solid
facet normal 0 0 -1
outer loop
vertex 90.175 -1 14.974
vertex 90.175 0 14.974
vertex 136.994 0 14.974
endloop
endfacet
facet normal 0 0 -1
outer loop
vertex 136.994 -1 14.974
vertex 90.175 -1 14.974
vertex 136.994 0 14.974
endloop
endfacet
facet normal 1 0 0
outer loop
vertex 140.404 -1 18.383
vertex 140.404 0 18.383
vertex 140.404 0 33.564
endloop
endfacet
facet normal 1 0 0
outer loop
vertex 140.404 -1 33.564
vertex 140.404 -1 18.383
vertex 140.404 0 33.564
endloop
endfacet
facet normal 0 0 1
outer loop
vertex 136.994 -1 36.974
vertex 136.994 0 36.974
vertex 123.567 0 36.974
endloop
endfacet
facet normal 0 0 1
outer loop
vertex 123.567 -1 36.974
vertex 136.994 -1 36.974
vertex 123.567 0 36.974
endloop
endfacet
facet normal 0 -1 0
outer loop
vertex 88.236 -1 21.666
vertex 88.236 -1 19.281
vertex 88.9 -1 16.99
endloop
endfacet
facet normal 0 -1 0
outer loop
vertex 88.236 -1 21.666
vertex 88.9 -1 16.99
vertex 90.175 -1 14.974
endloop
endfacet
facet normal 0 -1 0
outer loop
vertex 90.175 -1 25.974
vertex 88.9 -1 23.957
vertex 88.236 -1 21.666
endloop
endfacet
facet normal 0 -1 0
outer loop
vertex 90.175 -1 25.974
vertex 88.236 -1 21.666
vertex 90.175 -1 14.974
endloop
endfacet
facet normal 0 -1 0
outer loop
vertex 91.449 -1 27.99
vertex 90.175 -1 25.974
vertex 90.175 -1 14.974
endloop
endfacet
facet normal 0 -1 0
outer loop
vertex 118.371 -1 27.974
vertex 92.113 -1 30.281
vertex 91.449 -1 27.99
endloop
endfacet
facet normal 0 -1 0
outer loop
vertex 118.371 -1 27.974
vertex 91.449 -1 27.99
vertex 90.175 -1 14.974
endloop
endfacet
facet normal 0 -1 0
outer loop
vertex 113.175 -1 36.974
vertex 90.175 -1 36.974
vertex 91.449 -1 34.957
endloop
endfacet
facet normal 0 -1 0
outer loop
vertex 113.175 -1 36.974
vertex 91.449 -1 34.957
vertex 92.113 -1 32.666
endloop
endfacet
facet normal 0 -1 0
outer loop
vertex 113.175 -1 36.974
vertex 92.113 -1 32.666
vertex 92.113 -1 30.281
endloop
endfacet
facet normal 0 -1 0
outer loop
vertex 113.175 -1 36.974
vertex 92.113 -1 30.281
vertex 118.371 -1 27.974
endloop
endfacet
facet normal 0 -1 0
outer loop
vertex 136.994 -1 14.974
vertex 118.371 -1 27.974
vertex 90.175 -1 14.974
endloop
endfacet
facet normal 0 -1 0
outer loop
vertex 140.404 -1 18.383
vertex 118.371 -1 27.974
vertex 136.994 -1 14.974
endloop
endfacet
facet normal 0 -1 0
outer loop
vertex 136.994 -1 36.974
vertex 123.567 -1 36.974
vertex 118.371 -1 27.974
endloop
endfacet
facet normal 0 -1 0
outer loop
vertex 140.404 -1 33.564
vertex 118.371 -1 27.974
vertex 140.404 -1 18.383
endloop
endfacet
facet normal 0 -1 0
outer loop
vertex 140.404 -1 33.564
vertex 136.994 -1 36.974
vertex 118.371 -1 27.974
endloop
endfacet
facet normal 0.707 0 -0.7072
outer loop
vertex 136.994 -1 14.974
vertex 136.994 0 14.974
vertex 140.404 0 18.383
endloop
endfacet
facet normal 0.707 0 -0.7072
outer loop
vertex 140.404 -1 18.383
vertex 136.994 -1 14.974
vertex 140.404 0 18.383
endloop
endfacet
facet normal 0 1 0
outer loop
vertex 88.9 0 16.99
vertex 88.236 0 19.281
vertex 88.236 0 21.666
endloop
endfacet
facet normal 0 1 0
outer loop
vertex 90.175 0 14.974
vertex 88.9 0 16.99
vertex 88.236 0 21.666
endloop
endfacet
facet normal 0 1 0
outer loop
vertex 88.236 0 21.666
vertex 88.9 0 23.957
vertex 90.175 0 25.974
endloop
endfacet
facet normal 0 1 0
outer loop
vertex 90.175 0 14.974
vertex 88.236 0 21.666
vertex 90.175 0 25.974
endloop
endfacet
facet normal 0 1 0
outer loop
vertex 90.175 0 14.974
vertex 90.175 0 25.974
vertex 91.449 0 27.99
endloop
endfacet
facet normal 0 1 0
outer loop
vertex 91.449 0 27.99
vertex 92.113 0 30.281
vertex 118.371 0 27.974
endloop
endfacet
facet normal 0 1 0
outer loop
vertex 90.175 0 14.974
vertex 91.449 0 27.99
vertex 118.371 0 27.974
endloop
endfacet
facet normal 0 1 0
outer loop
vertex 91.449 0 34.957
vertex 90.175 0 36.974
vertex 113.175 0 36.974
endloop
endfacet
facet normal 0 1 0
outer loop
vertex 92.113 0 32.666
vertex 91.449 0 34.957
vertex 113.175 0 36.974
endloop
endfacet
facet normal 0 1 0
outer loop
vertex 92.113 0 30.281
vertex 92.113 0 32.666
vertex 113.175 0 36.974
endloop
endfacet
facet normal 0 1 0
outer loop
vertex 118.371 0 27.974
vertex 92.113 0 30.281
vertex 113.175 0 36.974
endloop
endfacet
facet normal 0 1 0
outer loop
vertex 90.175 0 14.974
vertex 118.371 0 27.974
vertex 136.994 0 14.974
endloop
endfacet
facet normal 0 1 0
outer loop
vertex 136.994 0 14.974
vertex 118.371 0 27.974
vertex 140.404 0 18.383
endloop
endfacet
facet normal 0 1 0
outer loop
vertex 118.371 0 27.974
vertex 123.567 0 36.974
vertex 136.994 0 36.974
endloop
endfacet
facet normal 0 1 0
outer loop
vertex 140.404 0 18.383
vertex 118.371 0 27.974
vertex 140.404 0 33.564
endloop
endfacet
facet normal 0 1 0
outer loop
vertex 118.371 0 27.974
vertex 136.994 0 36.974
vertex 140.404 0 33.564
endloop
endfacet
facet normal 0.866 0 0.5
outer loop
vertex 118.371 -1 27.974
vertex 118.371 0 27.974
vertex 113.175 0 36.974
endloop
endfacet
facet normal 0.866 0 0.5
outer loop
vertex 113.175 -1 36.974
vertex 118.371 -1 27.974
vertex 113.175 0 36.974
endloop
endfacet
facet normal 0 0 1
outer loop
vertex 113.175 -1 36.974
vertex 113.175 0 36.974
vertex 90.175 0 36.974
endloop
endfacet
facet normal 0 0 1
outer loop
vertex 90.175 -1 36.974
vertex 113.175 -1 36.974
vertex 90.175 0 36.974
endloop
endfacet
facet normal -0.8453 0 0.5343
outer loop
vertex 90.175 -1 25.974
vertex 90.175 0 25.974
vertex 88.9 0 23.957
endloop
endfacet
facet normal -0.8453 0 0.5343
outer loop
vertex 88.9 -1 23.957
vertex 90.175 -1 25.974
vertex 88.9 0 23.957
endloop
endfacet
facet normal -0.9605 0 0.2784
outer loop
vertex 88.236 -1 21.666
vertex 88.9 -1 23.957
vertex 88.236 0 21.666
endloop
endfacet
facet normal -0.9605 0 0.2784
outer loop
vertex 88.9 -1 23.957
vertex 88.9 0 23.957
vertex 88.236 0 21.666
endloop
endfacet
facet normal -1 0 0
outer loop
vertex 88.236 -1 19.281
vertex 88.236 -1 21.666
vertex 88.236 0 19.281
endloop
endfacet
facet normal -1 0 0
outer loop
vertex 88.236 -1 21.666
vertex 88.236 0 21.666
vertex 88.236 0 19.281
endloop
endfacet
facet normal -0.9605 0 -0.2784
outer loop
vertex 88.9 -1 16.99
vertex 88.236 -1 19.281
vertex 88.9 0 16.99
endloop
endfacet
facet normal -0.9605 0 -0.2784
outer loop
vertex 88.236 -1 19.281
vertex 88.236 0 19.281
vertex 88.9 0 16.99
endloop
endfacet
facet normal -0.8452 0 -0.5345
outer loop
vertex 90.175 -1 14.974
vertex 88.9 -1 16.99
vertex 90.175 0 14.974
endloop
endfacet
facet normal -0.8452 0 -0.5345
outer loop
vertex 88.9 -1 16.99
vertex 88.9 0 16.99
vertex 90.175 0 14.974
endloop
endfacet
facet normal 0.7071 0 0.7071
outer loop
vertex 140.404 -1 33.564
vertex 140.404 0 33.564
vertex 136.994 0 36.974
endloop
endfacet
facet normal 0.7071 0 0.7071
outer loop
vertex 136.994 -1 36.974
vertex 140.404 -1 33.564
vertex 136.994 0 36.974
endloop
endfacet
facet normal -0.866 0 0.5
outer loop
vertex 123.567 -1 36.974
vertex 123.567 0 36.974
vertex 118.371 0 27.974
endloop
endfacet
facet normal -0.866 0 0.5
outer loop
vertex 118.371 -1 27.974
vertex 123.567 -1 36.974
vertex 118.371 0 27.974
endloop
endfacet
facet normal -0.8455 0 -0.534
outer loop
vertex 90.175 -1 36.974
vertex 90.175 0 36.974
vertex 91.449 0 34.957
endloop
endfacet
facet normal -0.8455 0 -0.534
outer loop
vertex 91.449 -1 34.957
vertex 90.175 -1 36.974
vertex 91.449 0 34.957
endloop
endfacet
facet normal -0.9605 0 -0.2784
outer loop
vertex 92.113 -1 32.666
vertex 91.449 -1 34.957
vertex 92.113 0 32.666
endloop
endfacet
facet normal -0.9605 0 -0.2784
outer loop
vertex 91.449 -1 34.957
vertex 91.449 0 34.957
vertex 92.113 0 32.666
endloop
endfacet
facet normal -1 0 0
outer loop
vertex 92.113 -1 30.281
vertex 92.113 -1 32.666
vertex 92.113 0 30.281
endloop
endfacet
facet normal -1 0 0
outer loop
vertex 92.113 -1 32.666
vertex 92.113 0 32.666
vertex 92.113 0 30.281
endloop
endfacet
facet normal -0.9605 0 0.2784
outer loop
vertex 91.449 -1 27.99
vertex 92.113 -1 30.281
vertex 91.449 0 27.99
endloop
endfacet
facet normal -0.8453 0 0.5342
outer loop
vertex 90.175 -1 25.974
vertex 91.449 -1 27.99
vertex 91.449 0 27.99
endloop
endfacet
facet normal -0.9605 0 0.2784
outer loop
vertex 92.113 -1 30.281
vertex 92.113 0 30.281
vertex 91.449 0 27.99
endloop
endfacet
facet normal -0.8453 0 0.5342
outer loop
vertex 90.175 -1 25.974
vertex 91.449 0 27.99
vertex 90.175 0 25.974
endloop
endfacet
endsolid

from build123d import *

# Parameters (mm, degrees)
F1_DEPTH = 1


with BuildPart() as f1:
    # F0 (on Front) → F1 (new body)
    with BuildSketch(Plane.XZ):
        with BuildLine():
            Line((113.174544, 36.973573), (90.174544, 36.973573))
            ThreePointArc((90.174544, 36.973573), (92.196906, 31.473573), (90.174544, 25.973573))
            ThreePointArc((90.174544, 25.973573), (88.152182, 20.473573), (90.174544, 14.973573))
            Line((90.174544, 14.973573), (111.174544, 14.973573))
            Line((111.174544, 14.973573), (121.566849, 14.973573))
            Line((121.566849, 14.973573), (136.993918, 14.973573))
            Line((136.993918, 14.973573), (140.403688, 18.383343))
            Line((140.403688, 18.383343), (140.403688, 25.973573))
            Line((140.403688, 25.973573), (140.403688, 33.563804))
            Line((140.403688, 33.563804), (136.993918, 36.973573))
            Line((136.993918, 36.973573), (123.566849, 36.973573))
            Line((123.566849, 36.973573), (118.370696, 27.973573))
            Line((118.370696, 27.973573), (113.174544, 36.973573))
        make_face()
    extrude(amount=F1_DEPTH)


solid = f1.part
